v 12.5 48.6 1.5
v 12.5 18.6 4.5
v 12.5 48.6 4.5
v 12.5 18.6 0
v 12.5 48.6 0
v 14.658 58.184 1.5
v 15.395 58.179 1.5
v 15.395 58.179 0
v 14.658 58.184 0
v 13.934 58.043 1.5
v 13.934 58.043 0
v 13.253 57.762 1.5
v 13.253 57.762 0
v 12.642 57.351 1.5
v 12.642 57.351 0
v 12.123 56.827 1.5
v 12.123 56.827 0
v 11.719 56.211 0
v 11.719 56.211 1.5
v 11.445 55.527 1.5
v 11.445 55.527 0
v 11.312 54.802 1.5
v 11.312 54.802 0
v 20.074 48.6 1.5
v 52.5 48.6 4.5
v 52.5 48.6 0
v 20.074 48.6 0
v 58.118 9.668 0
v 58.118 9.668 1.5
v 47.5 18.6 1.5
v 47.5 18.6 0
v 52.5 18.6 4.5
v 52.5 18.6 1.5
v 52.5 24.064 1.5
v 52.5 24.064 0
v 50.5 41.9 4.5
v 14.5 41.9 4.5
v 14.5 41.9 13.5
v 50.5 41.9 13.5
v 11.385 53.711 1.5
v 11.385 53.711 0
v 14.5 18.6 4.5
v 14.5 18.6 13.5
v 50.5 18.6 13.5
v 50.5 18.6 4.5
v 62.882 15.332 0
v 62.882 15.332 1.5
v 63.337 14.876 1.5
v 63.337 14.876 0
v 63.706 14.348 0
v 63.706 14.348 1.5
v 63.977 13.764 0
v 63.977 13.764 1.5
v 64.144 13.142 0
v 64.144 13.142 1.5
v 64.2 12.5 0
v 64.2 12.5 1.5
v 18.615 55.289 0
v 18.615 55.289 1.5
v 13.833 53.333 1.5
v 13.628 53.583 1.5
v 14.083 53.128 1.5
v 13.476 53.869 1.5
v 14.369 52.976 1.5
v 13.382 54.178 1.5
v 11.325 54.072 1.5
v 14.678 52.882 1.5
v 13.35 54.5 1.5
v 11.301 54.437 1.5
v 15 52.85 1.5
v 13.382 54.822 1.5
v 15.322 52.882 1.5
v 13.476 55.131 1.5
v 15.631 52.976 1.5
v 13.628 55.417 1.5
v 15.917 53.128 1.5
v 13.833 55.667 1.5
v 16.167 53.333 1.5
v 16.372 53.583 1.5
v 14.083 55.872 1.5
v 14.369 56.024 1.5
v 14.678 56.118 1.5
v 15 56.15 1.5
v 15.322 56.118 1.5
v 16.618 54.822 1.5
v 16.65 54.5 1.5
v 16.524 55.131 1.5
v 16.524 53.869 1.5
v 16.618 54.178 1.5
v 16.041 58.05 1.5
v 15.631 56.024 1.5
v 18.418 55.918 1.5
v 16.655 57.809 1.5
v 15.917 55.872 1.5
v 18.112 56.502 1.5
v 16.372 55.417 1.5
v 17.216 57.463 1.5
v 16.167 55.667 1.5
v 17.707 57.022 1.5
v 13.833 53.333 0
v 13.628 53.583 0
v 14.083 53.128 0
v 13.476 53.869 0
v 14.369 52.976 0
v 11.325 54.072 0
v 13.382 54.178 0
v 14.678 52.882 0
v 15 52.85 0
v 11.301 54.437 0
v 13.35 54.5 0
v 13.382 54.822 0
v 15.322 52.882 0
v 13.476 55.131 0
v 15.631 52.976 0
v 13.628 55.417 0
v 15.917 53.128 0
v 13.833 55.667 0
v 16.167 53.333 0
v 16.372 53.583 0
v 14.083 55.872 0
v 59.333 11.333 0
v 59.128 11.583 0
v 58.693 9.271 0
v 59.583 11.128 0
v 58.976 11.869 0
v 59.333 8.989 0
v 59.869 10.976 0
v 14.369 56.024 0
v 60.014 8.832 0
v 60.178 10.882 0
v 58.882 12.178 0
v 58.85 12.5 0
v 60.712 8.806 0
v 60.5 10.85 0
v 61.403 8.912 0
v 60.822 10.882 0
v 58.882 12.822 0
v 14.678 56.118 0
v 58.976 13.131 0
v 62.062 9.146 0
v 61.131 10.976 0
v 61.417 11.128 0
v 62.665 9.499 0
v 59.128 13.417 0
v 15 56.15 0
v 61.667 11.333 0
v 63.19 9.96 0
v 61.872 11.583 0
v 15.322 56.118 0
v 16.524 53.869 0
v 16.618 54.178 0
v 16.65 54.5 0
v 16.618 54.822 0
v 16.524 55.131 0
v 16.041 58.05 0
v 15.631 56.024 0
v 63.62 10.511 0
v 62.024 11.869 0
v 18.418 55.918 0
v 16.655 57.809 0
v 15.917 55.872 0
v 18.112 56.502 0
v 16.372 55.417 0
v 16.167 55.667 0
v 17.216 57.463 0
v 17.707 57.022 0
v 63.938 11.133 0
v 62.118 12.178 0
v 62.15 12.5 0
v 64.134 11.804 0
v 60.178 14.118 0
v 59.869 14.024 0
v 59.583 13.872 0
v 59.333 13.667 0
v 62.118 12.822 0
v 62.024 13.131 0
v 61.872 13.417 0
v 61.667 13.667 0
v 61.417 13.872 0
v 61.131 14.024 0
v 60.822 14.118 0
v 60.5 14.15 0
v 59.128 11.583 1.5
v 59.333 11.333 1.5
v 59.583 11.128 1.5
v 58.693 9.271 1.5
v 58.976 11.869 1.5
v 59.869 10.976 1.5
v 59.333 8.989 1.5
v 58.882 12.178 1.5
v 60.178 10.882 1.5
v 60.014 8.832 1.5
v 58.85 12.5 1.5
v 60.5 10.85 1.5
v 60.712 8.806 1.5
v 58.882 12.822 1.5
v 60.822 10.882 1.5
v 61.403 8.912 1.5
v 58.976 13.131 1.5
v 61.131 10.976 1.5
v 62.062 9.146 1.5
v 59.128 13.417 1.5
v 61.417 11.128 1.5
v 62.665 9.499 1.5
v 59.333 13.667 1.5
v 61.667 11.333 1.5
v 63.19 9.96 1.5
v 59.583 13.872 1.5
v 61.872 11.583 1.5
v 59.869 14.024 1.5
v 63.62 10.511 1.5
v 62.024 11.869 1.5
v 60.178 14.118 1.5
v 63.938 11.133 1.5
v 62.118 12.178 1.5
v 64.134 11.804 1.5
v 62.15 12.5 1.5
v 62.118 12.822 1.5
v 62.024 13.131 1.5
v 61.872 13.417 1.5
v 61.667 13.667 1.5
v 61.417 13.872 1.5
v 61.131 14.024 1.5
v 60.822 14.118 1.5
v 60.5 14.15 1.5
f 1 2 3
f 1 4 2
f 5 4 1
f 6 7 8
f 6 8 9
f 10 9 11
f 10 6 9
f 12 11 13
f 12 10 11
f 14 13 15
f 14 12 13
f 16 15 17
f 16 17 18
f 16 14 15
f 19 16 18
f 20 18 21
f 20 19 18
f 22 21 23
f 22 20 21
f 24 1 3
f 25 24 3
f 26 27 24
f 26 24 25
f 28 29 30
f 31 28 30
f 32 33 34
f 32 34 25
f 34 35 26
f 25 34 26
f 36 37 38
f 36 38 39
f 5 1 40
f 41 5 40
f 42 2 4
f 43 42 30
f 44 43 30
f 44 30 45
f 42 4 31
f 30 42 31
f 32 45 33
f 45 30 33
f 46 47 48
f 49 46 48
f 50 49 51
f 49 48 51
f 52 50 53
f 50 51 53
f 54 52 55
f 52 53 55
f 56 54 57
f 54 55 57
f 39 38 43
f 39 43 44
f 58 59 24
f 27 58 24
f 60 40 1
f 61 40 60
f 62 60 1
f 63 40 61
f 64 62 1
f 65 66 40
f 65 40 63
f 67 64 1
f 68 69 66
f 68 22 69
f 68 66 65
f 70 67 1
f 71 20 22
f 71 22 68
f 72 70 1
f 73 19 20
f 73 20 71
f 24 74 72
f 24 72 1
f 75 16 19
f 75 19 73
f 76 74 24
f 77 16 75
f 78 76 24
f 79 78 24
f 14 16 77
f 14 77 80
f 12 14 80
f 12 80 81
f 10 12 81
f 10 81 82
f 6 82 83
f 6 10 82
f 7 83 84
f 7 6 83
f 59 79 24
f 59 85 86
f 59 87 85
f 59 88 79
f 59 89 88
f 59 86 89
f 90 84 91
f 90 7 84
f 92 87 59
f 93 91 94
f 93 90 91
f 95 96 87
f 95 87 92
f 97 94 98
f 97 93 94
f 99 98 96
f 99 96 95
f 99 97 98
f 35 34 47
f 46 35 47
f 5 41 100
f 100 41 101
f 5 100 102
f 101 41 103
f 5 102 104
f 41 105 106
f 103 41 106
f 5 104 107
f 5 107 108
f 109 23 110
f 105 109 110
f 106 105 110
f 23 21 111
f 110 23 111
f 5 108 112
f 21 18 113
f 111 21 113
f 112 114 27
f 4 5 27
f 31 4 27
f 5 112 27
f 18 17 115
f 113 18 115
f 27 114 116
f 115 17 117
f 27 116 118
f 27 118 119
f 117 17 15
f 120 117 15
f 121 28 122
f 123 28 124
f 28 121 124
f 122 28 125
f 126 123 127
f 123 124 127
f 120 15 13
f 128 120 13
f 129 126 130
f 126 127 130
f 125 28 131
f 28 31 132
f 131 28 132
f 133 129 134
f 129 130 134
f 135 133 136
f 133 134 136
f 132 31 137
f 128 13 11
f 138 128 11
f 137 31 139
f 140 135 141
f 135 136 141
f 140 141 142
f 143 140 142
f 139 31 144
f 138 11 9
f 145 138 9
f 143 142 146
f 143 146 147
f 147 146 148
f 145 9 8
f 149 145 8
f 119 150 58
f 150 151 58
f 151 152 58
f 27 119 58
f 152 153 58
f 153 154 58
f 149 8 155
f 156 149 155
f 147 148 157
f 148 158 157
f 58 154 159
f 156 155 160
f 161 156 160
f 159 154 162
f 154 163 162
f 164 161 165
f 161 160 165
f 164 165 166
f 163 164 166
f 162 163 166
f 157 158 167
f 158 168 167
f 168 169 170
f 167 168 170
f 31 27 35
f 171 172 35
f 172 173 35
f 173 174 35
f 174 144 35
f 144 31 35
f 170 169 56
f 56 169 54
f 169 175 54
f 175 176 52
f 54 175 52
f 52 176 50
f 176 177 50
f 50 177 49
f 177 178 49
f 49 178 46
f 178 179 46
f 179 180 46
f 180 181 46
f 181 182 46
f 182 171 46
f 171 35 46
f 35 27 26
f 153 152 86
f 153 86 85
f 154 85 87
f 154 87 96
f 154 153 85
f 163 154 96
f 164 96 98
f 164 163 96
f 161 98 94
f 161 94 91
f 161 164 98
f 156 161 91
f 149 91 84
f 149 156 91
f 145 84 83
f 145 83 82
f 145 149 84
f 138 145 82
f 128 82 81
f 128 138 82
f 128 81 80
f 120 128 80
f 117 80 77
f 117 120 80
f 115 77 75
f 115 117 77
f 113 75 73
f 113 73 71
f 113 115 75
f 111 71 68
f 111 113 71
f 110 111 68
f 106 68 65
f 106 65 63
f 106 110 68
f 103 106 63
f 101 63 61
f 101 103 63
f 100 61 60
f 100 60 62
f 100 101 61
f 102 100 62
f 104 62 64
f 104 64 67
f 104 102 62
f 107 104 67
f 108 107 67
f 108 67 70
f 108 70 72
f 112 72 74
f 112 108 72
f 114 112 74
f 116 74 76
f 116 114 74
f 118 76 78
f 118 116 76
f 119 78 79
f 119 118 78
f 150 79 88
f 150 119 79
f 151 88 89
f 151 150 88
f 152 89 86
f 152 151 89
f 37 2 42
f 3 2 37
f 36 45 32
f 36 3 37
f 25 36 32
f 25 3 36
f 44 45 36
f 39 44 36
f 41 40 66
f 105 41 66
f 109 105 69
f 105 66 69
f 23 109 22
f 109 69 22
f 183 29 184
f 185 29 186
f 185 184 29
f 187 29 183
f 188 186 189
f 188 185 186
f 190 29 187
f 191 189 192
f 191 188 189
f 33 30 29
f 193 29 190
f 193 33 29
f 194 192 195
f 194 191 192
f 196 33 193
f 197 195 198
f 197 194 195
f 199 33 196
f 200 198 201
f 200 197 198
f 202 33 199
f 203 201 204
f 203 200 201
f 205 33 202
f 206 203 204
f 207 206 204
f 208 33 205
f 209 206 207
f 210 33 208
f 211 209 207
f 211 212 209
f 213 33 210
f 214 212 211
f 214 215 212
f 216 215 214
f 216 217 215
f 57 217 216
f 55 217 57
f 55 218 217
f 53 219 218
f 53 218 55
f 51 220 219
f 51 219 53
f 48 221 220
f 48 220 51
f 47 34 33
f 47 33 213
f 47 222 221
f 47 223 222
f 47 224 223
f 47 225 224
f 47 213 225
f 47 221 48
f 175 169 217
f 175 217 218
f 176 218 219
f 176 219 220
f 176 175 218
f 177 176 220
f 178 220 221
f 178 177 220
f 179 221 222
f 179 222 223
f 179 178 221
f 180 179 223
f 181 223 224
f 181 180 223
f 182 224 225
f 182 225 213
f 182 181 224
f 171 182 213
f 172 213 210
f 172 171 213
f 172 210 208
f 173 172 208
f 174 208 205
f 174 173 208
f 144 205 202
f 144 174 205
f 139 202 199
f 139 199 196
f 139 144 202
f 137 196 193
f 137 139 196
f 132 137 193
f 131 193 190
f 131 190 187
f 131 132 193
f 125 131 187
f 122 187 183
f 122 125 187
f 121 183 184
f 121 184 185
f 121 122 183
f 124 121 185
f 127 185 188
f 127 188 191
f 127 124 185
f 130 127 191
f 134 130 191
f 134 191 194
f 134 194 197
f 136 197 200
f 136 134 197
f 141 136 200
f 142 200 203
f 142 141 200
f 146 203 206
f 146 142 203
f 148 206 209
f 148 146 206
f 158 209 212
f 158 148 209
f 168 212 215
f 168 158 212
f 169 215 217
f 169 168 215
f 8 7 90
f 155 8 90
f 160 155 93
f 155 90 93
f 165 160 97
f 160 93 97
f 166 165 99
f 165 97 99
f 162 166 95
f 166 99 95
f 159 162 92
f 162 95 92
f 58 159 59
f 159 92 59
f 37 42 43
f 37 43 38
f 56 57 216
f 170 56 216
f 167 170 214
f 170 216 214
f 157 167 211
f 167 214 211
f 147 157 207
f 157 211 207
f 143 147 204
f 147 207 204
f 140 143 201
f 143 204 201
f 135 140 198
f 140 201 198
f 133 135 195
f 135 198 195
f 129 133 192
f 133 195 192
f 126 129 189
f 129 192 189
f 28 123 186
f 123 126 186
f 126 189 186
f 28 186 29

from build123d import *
from build123d import SkipClean  # not in build123d's __all__

# Parameters (mm, degrees)
F0_R      = 1.65
F1_DEPTH  = 1.5
F3_DEPTH  = 1.501
F4_DEPTH  = 1.5
F5_W      = 40
F5_H      = 30
F6_DEPTH  = 3
F7_W      = 36
F7_H      = 23.3
F8_DEPTH  = 9
F10_DEPTH = 1.501


with BuildPart() as f1:
    # F0 (on Top) → F1 (new body)
    with BuildSketch(Plane.XY):
        with BuildLine():
            ThreePointArc((-0.73370891, 14), (-0.4891889552, 6.9935887205), (0, 0))
            Line((0, 0), (65, 0))
            ThreePointArc((65, 0), (65.4891889552, 6.9935887205), (65.73370891, 14))
            ThreePointArc((65.73370891, 14), (65.7334108185, 21.0021379582), (65.488741818, 28))
            Line((65.488741818, 28), (57.299411547, 50.5))
            ThreePointArc((57.299411547, 50.5), (32.5, 63.5), (7.700588453, 50.5))
            Line((7.700588453, 50.5), (-0.488741818, 28))
            ThreePointArc((-0.488741818, 28), (-0.7334108185, 21.0021379582), (-0.73370891, 14))
        make_face()
        with Locations((4.5, 12.5)):
            Circle(F0_R, mode=Mode.SUBTRACT)
        with Locations((60.5, 12.5)):
            Circle(F0_R, mode=Mode.SUBTRACT)
        with Locations((15, 54.5)):
            Circle(F0_R, mode=Mode.SUBTRACT)
    extrude(amount=F1_DEPTH)

    # F2 (on face) → F3 (cut, through all)
    with BuildSketch(Plane.XY.offset(1.5)):
        with BuildLine():
            ThreePointArc((15.3946260476, 58.178895253), (17.4713893755, 57.2535857631), (18.6149922575, 55.2885626028))
            Line((18.6149922575, 55.2885626028), (20.0740134556, 48.6))
            Line((20.0740134556, 48.6), (52.5, 48.6))
            Line((52.5, 48.6), (52.5, 24.064025175))
            Line((52.5, 24.064025175), (62.8817094627, 15.3315119698))
            ThreePointArc((62.8817094627, 15.3315119698), (63.8542752579, 14.0616777817), (64.2, 12.5))
            ThreePointArc((64.2, 12.5), (62.0616777817, 9.1457247421), (58.1182905373, 9.6684880302))
            Line((58.1182905373, 9.6684880302), (47.5, 18.6))
            Line((47.5, 18.6), (17.5, 18.6))
            Line((17.5, 18.6), (6.8817094627, 9.6684880302))
            ThreePointArc((6.8817094627, 9.6684880302), (1.6684880302, 10.1182905373), (2.1182905373, 15.3315119698))
            Line((2.1182905373, 15.3315119698), (12.5, 24.064025175))
            Line((12.5, 24.064025175), (12.5, 48.6))
            Line((12.5, 48.6), (11.3850077425, 53.7114373972))
            ThreePointArc((11.3850077425, 53.7114373972), (11.308192582, 54.2539146721), (11.3123280961, 54.8017878876))
            ThreePointArc((11.3123280961, 54.8017878876), (9.4060764304, 52.7351735725), (7.700588453, 50.5))
            Line((7.700588453, 50.5), (-0.488741818, 28))
            ThreePointArc((-0.488741818, 28), (-0.733560046, 13.9914611719), (0, 0))
            Line((0, 0), (65, 0))
            ThreePointArc((65, 0), (65.733560046, 13.9914611719), (65.488741818, 28))
            Line((65.488741818, 28), (57.299411547, 50.5))
            ThreePointArc((57.299411547, 50.5), (37.9351551683, 63.0061258111), (15.3946260476, 58.178895253))
        make_face()
    extrude(amount=-F3_DEPTH, mode=Mode.SUBTRACT)

    # F2 (on face) → F4 (join)
    with BuildSketch(Plane.XY.offset(1.5)):
        with BuildLine():
            ThreePointArc((11.3123280961, 54.8017878876), (13.2791635515, 56.5801728664), (15.3946260476, 58.178895253))
            ThreePointArc((15.3946260476, 58.178895253), (12.6415574435, 57.3509206772), (11.3123280961, 54.8017878876))
        make_face()
    with SkipClean():  # cleaning this boolean's faces spoils the solid; the shape is the same uncleaned
        extrude(amount=-F4_DEPTH)

    # F5 (on face) → F6 (join)
    with BuildSketch(Plane.XY.offset(1.5)):
        with Locations((32.5, 33.6)):
            Rectangle(F5_W, F5_H)
    extrude(amount=F6_DEPTH)

    # F7 (on face) → F8 (join)
    with BuildSketch(Plane.XY.offset(4.5)):
        with Locations((32.5, 30.25)):
            Rectangle(F7_W, F7_H)
    extrude(amount=F8_DEPTH)

    # F9 (on face) → F10 (cut, through all)
    with BuildSketch(Plane.XY.offset(1.5)):
        with BuildLine():
            ThreePointArc((7.348777143, 10.0613592332), (8.0174859123, 11.2000796728), (8.25, 12.5))
            ThreePointArc((8.25, 12.5), (6.3550732217, 15.7590187699), (2.5853582175, 15.7243831727))
            ThreePointArc((2.5853582175, 15.7243831727), (1.6302243549, 10.0861052742), (7.348777143, 10.0613592332))
        make_face()
        with BuildLine():
            ThreePointArc((2.5853582175, 15.7243831727), (6.3550732217, 15.7590187699), (8.25, 12.5))
            ThreePointArc((8.25, 12.5), (8.0174859123, 11.2000796728), (7.348777143, 10.0613592332))
            Line((7.348777143, 10.0613592332), (17.5, 18.6))
            Line((17.5, 18.6), (12.5, 18.6))
            Line((12.5, 18.6), (12.5, 24.064025175))
            Line((12.5, 24.064025175), (2.5853582175, 15.7243831727))
        make_face()
    extrude(amount=-F10_DEPTH, mode=Mode.SUBTRACT)


solid = f1.part
